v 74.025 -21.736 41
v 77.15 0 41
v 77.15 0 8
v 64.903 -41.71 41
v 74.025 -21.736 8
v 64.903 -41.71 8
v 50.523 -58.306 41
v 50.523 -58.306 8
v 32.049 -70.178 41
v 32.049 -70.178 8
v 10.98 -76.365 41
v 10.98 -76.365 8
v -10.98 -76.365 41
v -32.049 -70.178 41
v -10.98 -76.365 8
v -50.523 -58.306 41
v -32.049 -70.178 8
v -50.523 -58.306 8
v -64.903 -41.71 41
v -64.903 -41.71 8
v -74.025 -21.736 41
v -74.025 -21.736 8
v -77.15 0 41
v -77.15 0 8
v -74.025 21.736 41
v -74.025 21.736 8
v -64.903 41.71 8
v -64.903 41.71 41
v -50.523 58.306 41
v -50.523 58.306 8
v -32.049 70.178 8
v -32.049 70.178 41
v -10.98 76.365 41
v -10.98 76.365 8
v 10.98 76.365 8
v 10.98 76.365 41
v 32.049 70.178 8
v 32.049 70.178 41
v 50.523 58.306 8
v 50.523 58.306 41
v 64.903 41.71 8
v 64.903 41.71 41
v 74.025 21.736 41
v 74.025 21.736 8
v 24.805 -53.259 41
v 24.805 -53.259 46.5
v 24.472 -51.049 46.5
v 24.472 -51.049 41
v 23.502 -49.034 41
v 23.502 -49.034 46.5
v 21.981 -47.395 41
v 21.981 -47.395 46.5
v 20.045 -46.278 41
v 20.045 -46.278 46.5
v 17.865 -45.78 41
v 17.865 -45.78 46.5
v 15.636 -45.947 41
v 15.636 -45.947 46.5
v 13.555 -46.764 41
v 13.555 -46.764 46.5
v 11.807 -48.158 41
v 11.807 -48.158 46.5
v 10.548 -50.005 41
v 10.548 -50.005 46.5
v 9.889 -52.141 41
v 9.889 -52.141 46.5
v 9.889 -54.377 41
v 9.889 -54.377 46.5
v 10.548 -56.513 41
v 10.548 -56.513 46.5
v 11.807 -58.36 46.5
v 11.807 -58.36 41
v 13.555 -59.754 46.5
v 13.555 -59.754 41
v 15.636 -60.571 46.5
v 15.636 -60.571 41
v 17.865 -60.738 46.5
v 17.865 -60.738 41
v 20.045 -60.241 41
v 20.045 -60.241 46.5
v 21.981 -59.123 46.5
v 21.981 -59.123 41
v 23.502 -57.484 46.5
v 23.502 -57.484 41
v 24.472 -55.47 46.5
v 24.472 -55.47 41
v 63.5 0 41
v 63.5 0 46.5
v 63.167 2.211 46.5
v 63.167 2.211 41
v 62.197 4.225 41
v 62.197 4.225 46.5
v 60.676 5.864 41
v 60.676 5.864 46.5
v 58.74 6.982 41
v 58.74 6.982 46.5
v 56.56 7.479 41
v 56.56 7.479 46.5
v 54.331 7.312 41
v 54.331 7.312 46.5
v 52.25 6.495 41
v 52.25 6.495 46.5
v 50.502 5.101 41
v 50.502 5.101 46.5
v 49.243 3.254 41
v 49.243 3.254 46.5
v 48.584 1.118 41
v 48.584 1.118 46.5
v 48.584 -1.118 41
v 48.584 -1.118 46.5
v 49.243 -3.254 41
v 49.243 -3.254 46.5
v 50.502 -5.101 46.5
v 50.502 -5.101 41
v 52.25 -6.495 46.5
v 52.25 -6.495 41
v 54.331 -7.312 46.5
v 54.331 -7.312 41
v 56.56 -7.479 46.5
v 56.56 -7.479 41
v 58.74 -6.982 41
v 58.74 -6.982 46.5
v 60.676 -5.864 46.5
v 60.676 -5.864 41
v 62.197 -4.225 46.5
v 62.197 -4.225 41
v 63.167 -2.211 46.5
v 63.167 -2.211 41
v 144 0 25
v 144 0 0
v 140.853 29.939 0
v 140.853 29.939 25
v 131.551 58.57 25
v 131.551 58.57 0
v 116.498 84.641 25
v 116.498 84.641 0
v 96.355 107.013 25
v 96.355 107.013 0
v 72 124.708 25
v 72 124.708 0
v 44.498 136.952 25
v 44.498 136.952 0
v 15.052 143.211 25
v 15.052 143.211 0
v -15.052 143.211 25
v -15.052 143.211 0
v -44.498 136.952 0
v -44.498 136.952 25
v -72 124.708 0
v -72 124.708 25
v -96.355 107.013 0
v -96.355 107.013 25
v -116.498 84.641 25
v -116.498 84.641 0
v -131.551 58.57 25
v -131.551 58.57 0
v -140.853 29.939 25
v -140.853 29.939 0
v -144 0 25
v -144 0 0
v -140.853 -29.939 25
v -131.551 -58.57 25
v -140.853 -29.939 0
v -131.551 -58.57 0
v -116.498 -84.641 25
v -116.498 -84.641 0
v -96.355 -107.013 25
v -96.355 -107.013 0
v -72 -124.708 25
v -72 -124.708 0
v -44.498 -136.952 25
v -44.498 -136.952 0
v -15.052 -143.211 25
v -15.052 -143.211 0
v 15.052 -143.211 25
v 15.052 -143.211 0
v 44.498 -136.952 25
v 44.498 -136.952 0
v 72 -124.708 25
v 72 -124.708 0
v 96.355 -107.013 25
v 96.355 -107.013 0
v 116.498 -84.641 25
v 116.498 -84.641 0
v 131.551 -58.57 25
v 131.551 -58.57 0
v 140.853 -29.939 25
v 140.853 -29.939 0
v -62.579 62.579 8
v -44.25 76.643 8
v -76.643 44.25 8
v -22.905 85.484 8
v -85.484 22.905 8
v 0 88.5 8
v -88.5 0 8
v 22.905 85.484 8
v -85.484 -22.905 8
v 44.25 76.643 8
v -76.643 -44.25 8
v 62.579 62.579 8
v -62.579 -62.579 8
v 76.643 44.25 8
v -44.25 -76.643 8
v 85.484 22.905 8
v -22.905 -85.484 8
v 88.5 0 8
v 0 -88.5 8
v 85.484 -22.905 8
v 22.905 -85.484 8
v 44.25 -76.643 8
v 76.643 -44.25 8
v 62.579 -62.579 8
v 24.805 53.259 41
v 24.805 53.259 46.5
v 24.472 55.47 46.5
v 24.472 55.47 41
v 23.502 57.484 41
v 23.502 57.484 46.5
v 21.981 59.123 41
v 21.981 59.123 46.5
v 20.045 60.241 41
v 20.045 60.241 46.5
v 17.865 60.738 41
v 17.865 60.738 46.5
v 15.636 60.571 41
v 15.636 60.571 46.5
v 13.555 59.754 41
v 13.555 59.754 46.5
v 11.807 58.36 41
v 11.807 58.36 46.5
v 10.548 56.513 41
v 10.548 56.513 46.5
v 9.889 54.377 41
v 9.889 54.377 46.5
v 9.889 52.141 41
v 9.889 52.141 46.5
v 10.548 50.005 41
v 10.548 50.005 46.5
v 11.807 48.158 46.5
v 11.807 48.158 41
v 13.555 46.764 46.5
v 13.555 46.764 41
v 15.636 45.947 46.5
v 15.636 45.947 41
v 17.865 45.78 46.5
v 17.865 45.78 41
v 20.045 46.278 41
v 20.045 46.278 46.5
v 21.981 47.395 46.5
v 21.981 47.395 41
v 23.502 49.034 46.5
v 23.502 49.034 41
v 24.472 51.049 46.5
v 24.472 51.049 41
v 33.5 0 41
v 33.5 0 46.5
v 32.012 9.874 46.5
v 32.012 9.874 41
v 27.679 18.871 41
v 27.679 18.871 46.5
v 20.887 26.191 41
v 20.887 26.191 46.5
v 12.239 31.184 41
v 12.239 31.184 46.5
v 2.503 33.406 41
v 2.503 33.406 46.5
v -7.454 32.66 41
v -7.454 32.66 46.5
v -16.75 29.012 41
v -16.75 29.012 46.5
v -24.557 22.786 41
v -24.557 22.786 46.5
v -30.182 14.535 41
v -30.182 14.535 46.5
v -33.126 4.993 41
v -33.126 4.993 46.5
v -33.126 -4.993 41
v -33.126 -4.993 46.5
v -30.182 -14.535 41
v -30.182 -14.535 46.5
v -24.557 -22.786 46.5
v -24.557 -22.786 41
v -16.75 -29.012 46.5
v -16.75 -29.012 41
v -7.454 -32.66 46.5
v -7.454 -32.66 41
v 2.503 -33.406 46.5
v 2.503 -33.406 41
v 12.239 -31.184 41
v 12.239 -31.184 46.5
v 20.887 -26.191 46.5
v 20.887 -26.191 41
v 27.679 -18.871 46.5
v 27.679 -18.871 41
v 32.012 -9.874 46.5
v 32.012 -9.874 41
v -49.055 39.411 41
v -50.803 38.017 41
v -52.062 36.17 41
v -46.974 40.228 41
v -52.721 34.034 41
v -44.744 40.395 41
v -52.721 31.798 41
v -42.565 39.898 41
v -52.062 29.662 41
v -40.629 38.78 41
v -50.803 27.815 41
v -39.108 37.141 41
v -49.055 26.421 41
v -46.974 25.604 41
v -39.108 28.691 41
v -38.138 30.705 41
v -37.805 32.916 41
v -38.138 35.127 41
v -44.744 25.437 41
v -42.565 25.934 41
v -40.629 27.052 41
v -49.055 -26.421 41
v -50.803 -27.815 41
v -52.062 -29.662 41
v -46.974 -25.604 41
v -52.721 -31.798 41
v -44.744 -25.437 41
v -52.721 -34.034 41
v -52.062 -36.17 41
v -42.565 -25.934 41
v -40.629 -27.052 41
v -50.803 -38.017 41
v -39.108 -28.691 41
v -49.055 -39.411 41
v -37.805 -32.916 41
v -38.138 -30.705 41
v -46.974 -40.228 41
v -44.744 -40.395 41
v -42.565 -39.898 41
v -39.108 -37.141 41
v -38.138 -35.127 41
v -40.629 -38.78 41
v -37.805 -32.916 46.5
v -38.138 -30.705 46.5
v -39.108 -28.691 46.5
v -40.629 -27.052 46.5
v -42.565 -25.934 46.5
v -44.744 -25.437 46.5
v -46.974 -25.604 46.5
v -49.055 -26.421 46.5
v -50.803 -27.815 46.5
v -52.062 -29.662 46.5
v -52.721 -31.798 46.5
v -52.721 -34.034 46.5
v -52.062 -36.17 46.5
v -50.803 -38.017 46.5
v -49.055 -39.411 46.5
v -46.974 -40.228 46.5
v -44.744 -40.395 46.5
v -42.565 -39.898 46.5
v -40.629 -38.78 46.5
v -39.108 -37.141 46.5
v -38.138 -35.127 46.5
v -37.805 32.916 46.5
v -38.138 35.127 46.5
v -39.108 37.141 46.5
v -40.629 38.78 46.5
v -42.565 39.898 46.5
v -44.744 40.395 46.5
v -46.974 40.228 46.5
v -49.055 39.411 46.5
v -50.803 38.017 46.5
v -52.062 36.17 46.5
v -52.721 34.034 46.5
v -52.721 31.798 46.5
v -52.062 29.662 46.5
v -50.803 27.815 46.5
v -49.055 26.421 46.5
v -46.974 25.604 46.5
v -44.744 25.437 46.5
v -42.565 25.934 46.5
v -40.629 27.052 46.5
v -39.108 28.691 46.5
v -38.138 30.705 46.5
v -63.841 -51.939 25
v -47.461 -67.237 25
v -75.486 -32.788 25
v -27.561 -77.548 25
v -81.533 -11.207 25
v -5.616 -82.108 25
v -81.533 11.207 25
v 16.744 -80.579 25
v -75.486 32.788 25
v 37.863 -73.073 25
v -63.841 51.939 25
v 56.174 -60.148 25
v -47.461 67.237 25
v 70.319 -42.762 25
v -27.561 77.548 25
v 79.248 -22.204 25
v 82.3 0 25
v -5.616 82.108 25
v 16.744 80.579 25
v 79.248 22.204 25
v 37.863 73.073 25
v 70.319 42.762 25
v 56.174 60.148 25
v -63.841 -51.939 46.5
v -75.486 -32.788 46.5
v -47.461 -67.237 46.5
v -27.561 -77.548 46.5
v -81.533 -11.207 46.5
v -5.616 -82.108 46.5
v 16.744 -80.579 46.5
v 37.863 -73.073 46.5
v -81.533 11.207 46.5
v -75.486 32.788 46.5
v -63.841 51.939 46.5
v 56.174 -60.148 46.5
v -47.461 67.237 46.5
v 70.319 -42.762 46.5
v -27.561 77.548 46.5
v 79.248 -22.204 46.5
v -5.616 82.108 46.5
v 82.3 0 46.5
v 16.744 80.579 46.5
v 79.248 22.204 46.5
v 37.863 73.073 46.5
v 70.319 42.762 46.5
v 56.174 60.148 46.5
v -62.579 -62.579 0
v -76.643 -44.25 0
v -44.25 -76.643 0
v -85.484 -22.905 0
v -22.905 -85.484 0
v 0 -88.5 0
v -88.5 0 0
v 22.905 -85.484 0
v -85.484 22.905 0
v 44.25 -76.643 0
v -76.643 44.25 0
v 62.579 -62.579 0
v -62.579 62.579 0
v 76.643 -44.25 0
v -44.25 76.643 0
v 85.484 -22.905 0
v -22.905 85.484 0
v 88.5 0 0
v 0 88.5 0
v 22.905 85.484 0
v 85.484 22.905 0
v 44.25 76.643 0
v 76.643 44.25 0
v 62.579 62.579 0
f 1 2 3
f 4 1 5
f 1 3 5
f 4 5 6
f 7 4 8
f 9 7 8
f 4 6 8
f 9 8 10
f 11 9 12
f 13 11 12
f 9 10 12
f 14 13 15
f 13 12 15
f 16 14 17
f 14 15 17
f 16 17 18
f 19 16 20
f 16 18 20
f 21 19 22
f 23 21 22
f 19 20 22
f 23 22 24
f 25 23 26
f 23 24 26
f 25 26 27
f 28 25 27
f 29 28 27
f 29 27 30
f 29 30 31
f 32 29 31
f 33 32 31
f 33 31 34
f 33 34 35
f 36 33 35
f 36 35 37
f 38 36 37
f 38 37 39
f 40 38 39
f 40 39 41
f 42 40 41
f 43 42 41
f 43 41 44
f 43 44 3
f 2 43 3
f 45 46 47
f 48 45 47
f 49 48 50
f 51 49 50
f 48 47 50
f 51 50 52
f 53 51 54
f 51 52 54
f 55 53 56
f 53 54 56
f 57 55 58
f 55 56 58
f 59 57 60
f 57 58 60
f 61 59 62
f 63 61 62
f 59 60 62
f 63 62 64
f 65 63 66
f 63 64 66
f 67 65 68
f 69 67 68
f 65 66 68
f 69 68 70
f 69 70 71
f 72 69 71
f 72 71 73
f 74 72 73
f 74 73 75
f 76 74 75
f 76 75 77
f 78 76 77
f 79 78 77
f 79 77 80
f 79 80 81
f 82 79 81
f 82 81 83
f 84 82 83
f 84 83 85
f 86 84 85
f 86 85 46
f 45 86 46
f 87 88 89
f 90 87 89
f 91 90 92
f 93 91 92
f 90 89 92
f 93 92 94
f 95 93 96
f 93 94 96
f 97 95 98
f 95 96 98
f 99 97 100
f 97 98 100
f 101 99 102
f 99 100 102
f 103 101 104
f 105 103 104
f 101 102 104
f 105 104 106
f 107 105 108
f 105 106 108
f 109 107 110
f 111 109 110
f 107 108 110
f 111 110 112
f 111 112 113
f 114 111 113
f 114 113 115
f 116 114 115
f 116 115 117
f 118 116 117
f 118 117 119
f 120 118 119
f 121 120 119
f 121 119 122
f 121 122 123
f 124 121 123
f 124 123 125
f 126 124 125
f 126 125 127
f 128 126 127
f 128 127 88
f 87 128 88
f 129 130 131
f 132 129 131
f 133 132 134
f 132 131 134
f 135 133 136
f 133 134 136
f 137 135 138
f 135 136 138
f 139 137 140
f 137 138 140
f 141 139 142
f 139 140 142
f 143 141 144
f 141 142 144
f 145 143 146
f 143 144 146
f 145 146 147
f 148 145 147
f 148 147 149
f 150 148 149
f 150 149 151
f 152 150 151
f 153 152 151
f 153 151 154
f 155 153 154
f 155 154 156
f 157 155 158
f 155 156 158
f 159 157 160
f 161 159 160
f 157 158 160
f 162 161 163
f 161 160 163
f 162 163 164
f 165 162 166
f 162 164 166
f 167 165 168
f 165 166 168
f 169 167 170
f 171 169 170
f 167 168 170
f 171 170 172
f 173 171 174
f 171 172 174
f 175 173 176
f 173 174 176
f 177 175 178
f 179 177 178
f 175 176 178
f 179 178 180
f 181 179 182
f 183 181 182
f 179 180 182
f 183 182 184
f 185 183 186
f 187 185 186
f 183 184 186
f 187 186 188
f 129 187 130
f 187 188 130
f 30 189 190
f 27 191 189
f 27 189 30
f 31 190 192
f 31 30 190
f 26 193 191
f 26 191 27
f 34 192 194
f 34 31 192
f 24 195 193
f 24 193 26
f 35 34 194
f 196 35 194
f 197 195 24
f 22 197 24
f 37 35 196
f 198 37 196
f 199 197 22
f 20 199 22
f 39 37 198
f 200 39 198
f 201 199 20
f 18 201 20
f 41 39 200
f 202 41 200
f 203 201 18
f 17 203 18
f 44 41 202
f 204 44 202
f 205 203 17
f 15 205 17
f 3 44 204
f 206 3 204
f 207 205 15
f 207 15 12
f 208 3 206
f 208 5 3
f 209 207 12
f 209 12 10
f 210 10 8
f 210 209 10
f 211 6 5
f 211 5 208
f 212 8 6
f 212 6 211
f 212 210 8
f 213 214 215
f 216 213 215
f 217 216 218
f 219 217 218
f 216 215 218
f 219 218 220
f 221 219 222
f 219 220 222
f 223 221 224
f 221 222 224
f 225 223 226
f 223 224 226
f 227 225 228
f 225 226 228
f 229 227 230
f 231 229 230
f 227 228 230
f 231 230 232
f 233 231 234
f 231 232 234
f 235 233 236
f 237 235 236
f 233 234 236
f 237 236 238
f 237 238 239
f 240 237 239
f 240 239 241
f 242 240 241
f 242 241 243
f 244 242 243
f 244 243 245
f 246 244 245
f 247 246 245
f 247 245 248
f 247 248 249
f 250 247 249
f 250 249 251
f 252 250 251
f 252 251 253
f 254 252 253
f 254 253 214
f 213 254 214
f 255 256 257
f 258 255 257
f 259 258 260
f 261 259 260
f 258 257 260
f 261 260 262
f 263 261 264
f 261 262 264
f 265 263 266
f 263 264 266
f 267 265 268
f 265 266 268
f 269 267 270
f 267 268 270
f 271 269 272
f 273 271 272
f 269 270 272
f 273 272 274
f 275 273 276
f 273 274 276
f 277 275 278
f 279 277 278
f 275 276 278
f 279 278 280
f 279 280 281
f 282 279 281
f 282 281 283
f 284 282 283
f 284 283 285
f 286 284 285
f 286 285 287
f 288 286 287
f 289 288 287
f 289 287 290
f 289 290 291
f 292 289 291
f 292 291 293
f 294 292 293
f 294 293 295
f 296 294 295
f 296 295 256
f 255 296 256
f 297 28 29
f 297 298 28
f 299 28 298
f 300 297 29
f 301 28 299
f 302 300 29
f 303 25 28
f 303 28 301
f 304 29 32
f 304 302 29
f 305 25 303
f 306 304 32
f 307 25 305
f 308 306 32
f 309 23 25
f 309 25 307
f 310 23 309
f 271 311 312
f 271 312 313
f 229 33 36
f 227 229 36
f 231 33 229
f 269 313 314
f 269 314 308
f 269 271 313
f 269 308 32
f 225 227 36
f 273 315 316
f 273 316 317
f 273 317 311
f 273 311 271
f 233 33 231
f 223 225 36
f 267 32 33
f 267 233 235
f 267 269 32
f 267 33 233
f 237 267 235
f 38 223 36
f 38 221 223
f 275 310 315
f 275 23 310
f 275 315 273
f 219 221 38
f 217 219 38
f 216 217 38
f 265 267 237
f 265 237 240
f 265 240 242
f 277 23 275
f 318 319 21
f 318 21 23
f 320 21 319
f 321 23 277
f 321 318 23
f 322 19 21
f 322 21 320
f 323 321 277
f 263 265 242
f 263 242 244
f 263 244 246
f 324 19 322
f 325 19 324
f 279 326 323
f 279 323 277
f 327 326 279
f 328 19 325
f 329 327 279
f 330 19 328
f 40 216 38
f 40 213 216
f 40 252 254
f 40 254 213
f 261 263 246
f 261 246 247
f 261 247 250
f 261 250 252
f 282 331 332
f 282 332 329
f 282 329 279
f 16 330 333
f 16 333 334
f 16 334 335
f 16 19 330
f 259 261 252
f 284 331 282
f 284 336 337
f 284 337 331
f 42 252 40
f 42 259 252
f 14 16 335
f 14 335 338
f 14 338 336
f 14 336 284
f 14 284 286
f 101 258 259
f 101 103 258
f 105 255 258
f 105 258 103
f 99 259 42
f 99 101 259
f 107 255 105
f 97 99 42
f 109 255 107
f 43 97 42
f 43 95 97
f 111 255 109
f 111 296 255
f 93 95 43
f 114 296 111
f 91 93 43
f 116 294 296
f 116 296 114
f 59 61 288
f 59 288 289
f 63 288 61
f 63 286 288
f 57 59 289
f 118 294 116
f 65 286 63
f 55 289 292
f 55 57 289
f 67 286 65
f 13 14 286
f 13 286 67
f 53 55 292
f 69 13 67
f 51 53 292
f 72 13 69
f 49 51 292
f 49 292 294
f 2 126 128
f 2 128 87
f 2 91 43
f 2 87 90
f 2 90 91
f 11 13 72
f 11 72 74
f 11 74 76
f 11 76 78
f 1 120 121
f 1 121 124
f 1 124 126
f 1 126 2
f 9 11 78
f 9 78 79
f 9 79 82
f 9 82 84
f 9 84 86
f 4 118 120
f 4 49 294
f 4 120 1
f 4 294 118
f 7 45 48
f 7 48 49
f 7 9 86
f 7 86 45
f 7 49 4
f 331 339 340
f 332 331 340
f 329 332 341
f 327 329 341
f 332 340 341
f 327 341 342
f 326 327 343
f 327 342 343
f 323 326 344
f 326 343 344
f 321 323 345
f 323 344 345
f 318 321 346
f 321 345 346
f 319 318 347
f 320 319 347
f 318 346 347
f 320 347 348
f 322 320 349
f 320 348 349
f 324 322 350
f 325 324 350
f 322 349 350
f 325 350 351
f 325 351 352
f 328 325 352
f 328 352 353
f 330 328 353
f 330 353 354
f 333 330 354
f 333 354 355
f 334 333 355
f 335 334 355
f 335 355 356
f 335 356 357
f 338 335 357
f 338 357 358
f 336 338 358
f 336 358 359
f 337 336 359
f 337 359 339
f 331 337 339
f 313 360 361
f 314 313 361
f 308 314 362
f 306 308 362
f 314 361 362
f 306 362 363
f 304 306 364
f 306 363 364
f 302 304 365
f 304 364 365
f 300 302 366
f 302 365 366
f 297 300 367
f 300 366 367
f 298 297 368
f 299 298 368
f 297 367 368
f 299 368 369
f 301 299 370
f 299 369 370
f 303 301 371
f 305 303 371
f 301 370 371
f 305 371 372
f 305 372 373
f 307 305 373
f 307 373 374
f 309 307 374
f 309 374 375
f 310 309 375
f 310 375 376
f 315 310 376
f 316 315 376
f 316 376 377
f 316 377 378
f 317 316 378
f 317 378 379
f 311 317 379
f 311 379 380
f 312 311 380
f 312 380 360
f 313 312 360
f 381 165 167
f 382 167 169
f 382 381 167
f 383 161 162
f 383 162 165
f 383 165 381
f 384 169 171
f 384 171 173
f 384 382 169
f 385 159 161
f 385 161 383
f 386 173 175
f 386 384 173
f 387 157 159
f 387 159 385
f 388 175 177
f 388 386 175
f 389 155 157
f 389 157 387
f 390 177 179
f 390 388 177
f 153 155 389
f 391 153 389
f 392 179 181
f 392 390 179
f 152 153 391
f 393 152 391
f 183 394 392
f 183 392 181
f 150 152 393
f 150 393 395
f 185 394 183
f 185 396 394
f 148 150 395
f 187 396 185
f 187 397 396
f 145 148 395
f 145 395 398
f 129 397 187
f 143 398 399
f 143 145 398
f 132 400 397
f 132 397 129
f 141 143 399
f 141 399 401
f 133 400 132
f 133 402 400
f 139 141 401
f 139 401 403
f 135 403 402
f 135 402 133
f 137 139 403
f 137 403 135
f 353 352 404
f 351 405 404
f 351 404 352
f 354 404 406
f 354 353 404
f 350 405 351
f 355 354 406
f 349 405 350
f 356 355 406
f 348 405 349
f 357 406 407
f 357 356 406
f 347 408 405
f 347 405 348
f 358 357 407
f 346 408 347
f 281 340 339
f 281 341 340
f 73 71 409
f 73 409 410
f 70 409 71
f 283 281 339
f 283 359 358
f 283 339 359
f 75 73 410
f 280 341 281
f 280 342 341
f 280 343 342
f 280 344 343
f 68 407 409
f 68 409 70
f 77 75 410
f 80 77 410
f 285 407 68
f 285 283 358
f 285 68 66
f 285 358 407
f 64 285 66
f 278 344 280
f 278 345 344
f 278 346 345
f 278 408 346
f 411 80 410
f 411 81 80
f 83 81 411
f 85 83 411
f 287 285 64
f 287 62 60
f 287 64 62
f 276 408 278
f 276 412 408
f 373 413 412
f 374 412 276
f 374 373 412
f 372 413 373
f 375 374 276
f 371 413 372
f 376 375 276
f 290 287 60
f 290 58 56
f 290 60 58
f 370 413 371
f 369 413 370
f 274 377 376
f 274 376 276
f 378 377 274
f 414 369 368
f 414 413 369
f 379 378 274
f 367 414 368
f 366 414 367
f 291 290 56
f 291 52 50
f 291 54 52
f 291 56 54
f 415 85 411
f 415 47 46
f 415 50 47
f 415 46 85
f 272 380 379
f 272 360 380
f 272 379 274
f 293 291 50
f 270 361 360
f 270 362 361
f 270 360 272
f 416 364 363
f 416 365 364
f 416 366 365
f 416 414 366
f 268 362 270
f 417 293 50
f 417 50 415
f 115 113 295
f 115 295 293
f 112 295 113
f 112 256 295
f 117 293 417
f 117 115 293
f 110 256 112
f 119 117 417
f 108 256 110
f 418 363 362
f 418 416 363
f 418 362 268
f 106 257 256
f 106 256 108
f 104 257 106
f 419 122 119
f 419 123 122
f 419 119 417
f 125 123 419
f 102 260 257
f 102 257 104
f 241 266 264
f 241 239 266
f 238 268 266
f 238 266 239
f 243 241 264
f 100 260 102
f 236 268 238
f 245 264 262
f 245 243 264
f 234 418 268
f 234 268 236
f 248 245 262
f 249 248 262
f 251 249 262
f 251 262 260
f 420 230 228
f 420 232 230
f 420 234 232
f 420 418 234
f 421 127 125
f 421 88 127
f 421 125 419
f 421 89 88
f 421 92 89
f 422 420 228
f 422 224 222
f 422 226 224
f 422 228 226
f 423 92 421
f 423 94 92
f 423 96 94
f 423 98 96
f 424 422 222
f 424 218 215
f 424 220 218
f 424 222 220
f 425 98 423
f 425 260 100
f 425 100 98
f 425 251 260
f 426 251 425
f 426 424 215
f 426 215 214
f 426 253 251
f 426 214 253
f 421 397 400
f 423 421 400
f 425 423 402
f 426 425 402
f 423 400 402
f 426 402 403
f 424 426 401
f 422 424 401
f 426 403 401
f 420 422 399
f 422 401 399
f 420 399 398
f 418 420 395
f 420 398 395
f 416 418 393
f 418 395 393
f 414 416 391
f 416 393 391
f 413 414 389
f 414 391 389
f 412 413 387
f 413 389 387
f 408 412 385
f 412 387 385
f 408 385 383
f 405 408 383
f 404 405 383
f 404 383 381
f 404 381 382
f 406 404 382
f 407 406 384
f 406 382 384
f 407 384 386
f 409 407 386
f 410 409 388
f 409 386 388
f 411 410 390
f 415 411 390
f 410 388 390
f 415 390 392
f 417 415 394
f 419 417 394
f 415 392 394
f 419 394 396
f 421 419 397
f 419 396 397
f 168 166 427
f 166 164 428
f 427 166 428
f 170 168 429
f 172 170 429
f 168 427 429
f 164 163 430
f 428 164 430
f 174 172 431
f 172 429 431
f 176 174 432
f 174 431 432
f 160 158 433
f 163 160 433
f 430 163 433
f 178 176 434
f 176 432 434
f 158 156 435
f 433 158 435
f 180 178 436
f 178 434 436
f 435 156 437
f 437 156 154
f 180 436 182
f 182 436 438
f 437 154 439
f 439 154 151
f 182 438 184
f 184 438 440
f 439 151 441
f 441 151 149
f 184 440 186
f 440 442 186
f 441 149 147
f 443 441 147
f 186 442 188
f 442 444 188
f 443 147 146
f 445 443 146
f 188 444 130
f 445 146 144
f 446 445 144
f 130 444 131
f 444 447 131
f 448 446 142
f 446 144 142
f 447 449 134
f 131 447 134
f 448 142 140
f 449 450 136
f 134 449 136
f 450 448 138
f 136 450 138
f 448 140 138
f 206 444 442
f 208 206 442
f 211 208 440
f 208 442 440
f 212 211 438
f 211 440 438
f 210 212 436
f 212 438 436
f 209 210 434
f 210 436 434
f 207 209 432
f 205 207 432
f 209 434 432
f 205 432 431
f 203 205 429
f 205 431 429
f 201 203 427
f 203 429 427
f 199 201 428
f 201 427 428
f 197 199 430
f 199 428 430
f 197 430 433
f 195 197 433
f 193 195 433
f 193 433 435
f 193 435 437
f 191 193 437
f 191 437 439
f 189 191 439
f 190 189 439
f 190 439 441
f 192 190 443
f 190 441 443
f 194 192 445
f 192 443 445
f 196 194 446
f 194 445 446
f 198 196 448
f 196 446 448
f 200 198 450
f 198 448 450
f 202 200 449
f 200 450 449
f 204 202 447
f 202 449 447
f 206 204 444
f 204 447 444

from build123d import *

# Parameters (mm, degrees)
F0_R     = 144
F1_DEPTH = 25
F2_R     = 82.3
F3_DEPTH = 21.5
F4_R     = 77.15
F5_DEPTH = 41
F6_R     = 88.5
F7_DEPTH = 8
F8_R     = 33.5
F8_R_2   = 7.5
F9_DEPTH = 25


with BuildPart() as f1:
    # F0 (on Top) → F1 (new body)
    with BuildSketch(Plane.XY):
        Circle(F0_R)
    extrude(amount=F1_DEPTH)

    # F2 (on face) → F3 (join)
    with BuildSketch(Plane.XY.offset(25)):
        Circle(F2_R)
    extrude(amount=F3_DEPTH)

    # F4 (on face) → F5 (cut)
    with BuildSketch(Plane(origin=(0, 0, 0), x_dir=(1, 0, 0), z_dir=(0, 0, -1))):
        Circle(F4_R)
    extrude(amount=-F5_DEPTH, mode=Mode.SUBTRACT)

    # F6 (on face) → F7 (cut)
    with BuildSketch(Plane(origin=(0, 0, 0), x_dir=(1, 0, 0), z_dir=(0, 0, -1))):
        Circle(F6_R)
    extrude(amount=-F7_DEPTH, mode=Mode.SUBTRACT)

    # F8 (on face) → F9 (cut)
    with BuildSketch(Plane.XY.offset(46.5)):
        Circle(F8_R)
        with Locations((56, 0)):
            Circle(F8_R_2)
        with Locations((17.304952, 53.259165)):
            Circle(F8_R_2)
        with Locations((-45.304952, 32.915974)):
            Circle(F8_R_2)
        with Locations((-45.304952, -32.915974)):
            Circle(F8_R_2)
        with Locations((17.304952, -53.259165)):
            Circle(F8_R_2)
    extrude(amount=-F9_DEPTH, mode=Mode.SUBTRACT)


solid = f1.part
